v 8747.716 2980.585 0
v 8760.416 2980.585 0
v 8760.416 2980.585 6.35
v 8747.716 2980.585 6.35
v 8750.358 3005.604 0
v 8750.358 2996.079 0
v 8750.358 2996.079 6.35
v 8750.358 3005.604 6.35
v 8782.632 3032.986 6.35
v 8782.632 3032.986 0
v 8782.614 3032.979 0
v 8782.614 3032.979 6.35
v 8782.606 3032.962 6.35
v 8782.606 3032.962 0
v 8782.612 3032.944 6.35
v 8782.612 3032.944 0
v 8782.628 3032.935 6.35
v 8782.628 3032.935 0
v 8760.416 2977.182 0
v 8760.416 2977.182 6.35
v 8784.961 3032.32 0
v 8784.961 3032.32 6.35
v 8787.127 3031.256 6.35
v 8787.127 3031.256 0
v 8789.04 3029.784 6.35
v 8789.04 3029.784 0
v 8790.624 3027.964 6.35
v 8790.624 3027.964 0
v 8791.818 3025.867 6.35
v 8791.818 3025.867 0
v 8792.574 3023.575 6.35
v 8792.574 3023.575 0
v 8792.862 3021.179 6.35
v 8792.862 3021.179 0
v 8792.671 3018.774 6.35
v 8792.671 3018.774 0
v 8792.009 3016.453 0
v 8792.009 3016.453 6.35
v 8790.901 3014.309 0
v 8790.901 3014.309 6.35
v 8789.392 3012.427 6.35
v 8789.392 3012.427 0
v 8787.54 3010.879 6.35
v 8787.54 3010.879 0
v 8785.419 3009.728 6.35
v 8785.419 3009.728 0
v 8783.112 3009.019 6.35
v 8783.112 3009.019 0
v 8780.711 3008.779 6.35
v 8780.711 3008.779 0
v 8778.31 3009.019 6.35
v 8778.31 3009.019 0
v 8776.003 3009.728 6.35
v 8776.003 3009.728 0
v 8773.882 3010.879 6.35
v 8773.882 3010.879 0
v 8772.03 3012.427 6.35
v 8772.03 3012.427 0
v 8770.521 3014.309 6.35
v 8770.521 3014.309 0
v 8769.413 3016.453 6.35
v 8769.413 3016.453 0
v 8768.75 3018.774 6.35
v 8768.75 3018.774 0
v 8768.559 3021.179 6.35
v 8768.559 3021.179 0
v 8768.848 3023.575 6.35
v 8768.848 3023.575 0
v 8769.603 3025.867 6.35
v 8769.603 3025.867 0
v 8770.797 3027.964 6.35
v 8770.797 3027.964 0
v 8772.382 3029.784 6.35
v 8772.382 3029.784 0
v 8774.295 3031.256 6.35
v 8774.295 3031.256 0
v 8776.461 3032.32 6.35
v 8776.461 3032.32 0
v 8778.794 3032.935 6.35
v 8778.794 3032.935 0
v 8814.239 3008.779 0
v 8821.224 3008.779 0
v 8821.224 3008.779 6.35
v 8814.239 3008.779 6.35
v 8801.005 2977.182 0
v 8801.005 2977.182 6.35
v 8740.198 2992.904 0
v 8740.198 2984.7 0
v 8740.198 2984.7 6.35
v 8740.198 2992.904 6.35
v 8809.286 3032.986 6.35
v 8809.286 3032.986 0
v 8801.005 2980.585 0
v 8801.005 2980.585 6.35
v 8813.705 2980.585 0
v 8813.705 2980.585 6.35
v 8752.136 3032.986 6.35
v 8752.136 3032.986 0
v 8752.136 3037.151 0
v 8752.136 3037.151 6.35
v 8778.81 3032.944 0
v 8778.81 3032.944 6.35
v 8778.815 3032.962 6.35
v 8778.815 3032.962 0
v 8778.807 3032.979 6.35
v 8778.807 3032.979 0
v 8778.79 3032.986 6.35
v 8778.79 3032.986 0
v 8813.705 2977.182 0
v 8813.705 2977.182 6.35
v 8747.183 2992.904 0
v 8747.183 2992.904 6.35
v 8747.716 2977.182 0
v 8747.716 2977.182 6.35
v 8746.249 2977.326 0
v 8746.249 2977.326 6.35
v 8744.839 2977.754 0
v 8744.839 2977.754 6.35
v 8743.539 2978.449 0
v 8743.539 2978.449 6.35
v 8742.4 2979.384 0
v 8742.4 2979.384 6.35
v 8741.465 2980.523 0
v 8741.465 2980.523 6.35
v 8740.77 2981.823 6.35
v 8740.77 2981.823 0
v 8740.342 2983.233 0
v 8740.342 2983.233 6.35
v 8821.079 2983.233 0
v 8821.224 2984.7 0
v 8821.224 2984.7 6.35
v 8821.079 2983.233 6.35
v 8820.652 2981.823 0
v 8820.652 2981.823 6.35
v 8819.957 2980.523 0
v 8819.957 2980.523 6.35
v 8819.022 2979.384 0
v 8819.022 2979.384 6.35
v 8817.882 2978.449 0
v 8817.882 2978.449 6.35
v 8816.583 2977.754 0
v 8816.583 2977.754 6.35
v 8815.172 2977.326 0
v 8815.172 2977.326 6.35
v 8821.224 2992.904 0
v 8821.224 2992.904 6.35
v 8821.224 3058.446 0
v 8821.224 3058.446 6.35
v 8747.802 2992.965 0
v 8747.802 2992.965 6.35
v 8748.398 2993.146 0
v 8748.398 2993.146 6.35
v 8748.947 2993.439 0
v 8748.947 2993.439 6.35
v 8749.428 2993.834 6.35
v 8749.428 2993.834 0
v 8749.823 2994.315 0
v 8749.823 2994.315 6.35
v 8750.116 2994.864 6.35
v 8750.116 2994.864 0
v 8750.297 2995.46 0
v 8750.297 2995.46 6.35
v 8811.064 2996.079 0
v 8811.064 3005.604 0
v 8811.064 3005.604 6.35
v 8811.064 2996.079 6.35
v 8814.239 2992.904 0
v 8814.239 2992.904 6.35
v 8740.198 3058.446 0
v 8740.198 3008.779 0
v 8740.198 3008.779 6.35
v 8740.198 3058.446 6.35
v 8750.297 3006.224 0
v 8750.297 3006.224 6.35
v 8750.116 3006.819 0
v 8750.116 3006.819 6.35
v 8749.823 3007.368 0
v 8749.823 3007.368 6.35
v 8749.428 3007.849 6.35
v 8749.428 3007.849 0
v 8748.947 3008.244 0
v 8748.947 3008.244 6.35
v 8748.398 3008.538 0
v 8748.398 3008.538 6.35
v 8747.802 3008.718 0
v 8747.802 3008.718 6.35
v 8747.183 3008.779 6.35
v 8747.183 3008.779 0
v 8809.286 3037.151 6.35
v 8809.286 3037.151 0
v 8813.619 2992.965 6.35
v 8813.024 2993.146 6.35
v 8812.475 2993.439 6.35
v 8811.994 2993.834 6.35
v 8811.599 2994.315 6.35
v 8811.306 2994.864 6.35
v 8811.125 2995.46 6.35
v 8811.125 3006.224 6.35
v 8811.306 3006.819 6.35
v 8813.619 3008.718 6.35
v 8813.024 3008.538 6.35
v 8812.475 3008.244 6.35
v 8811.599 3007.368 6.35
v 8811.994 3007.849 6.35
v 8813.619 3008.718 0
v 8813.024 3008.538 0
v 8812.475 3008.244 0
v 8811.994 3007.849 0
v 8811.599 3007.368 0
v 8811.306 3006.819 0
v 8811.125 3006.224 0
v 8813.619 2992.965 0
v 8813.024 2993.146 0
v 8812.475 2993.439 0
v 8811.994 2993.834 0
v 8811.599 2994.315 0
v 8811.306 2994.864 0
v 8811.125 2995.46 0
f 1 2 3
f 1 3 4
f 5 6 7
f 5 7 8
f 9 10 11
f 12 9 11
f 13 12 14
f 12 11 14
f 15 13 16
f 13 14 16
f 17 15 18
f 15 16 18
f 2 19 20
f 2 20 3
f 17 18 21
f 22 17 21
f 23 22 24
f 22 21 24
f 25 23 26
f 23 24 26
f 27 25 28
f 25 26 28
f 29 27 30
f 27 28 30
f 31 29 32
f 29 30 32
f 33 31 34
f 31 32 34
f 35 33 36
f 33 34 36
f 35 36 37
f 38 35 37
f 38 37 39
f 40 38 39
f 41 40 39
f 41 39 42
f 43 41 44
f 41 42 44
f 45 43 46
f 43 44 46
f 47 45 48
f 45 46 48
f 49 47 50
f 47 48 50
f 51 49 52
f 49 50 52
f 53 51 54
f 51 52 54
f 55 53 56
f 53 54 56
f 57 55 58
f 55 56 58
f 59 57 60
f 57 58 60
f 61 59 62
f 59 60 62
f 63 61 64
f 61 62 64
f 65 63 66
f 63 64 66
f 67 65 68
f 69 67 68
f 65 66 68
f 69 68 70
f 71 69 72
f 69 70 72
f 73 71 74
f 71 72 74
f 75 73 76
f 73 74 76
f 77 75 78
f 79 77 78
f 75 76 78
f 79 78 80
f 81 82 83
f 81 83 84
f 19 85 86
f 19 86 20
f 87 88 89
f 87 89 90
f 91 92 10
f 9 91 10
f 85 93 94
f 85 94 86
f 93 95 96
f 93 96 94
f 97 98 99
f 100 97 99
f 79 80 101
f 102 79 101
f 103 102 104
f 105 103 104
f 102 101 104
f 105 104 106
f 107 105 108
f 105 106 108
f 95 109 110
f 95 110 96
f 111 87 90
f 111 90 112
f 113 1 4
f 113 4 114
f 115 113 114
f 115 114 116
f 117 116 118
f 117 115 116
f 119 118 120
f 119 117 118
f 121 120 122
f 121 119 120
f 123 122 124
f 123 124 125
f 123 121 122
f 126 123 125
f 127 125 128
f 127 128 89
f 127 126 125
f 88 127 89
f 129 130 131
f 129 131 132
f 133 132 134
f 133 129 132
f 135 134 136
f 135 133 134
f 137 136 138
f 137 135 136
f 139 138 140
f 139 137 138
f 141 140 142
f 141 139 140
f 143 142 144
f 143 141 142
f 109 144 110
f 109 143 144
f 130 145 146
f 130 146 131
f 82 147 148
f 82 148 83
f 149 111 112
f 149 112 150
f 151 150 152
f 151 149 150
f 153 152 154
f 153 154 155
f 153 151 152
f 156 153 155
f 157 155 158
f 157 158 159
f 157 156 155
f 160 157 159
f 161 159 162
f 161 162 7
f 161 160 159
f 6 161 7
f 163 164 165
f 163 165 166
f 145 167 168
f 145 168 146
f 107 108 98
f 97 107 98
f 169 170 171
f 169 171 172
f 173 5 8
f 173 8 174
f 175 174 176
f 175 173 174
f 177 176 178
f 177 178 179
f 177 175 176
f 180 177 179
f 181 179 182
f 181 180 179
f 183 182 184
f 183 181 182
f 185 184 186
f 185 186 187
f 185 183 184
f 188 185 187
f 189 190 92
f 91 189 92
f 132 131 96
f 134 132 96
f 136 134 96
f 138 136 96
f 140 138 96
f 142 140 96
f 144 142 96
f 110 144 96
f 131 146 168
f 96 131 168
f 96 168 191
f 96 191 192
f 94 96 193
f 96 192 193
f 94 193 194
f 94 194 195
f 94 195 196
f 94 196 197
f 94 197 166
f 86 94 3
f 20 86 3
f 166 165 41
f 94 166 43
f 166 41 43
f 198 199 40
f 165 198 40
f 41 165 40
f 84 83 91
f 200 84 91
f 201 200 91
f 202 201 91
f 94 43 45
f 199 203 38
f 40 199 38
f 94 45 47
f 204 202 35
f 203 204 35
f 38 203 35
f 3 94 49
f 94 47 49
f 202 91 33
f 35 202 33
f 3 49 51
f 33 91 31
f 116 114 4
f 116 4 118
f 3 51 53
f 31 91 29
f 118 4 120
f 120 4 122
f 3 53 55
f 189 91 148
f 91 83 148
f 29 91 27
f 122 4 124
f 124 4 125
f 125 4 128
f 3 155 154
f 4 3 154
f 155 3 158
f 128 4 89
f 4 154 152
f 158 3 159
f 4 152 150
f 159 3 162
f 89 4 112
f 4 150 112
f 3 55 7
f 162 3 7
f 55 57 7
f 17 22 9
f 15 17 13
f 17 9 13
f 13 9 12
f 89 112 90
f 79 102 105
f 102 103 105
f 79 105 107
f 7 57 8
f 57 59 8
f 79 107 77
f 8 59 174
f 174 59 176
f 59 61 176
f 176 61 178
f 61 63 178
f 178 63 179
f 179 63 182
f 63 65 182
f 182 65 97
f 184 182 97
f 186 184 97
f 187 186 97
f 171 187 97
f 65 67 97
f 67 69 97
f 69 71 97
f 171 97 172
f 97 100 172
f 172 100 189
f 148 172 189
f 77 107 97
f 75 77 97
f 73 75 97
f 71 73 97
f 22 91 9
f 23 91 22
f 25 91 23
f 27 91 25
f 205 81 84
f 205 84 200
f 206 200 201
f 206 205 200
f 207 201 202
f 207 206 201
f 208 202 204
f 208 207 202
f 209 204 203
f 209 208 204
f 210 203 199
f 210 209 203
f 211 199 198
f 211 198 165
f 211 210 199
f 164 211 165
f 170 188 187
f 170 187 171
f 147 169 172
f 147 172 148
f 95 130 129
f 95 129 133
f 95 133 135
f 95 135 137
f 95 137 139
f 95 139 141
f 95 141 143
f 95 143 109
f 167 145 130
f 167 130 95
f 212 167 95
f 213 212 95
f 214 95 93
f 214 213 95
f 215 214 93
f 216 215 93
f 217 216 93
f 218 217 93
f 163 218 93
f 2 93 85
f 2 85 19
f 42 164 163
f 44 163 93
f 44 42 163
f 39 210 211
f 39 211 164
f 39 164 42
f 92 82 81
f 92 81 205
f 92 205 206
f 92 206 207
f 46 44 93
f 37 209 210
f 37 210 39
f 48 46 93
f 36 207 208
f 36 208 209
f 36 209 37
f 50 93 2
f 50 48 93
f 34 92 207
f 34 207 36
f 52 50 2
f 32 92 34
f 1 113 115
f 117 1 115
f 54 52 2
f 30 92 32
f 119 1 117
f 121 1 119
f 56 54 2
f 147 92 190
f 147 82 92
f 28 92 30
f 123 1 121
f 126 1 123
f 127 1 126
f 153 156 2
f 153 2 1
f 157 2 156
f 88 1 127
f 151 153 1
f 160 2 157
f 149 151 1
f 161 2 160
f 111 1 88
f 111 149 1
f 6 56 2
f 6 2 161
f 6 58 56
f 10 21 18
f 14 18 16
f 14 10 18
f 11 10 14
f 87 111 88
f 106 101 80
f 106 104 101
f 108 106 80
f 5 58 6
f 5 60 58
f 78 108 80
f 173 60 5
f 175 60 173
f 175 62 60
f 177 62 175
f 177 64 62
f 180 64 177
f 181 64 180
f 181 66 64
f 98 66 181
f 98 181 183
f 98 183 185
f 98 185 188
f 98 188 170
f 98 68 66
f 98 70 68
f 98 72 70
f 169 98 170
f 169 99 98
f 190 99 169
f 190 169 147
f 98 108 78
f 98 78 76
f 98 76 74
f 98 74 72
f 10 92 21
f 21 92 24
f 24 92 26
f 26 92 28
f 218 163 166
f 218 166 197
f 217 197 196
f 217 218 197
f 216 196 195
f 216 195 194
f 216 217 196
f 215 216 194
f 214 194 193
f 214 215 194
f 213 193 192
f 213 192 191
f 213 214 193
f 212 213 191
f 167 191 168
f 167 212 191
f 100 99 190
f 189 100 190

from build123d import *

# Parameters (mm, degrees)
BOSS_EXTRUDE1_DEPTH = 6.35


with BuildPart() as part:
    # Sketch2 → Boss-Extrude1 (new body)
    with BuildSketch(Plane.XY):
        with BuildLine():
            Line((8821.223823253, 3058.445977911), (8821.223823253, 3008.779305873))
            Line((8821.223823253, 3008.779305873), (8814.238823253, 3008.779305873))
            ThreePointArc((8814.238823253, 3008.779305873), (8811.993759223, 3007.849369904), (8811.063823253, 3005.604305873))
            Line((8811.063823253, 3005.604305873), (8811.063823253, 2996.079305873))
            ThreePointArc((8811.063823253, 2996.079305873), (8811.993759223, 2993.834241843), (8814.238823253, 2992.904305873))
            Line((8814.238823253, 2992.904305873), (8821.223823253, 2992.904305873))
            Line((8821.223823253, 2992.904305873), (8821.223823253, 2984.700105873))
            ThreePointArc((8821.223823253, 2984.700105873), (8819.021734877, 2979.38379425), (8813.705423253, 2977.181705873))
            Line((8813.705423253, 2977.181705873), (8813.705423253, 2980.585305873))
            Line((8813.705423253, 2980.585305873), (8801.005423253, 2980.585305873))
            Line((8801.005423253, 2980.585305873), (8801.005423253, 2977.181705873))
            Line((8801.005423253, 2977.181705873), (8760.416223253, 2977.181705873))
            Line((8760.416223253, 2977.181705873), (8760.416223253, 2980.585305873))
            Line((8760.416223253, 2980.585305873), (8747.716223253, 2980.585305873))
            Line((8747.716223253, 2980.585305873), (8747.716223253, 2977.181705873))
            ThreePointArc((8747.716223253, 2977.181705873), (8742.399911629, 2979.38379425), (8740.197823253, 2984.700105873))
            Line((8740.197823253, 2984.700105873), (8740.197823253, 2992.904305873))
            Line((8740.197823253, 2992.904305873), (8747.182823253, 2992.904305873))
            ThreePointArc((8747.182823253, 2992.904305873), (8749.427887283, 2993.834241843), (8750.357823253, 2996.079305873))
            Line((8750.357823253, 2996.079305873), (8750.357823253, 3005.604305873))
            ThreePointArc((8750.357823253, 3005.604305873), (8749.427887283, 3007.849369904), (8747.182823253, 3008.779305873))
            Line((8747.182823253, 3008.779305873), (8740.197823253, 3008.779305873))
            Line((8740.197823253, 3008.779305873), (8740.197823253, 3058.445977911))
            Line((8740.197823253, 3058.445977911), (8821.223823253, 3058.445977911))
        make_face()
        with BuildLine():
            Line((8809.285823253, 3037.151105873), (8809.285823253, 3032.985505873))
            Line((8809.285823253, 3032.985505873), (8782.631506696, 3032.985505873))
            ThreePointArc((8782.631506696, 3032.985505873), (8782.606186279, 3032.962114966), (8782.6275011, 3032.935023704))
            ThreePointArc((8782.6275011, 3032.935023704), (8780.710823253, 3008.779305873), (8778.794145406, 3032.935023704))
            ThreePointArc((8778.794145406, 3032.935023704), (8778.81546023, 3032.962114966), (8778.79013981, 3032.985505873))
            Line((8778.79013981, 3032.985505873), (8752.135823253, 3032.985505873))
            Line((8752.135823253, 3032.985505873), (8752.135823253, 3037.151105873))
            Line((8752.135823253, 3037.151105873), (8809.285823253, 3037.151105873))
        make_face(mode=Mode.SUBTRACT)
    extrude(amount=BOSS_EXTRUDE1_DEPTH)


solid = part.part
